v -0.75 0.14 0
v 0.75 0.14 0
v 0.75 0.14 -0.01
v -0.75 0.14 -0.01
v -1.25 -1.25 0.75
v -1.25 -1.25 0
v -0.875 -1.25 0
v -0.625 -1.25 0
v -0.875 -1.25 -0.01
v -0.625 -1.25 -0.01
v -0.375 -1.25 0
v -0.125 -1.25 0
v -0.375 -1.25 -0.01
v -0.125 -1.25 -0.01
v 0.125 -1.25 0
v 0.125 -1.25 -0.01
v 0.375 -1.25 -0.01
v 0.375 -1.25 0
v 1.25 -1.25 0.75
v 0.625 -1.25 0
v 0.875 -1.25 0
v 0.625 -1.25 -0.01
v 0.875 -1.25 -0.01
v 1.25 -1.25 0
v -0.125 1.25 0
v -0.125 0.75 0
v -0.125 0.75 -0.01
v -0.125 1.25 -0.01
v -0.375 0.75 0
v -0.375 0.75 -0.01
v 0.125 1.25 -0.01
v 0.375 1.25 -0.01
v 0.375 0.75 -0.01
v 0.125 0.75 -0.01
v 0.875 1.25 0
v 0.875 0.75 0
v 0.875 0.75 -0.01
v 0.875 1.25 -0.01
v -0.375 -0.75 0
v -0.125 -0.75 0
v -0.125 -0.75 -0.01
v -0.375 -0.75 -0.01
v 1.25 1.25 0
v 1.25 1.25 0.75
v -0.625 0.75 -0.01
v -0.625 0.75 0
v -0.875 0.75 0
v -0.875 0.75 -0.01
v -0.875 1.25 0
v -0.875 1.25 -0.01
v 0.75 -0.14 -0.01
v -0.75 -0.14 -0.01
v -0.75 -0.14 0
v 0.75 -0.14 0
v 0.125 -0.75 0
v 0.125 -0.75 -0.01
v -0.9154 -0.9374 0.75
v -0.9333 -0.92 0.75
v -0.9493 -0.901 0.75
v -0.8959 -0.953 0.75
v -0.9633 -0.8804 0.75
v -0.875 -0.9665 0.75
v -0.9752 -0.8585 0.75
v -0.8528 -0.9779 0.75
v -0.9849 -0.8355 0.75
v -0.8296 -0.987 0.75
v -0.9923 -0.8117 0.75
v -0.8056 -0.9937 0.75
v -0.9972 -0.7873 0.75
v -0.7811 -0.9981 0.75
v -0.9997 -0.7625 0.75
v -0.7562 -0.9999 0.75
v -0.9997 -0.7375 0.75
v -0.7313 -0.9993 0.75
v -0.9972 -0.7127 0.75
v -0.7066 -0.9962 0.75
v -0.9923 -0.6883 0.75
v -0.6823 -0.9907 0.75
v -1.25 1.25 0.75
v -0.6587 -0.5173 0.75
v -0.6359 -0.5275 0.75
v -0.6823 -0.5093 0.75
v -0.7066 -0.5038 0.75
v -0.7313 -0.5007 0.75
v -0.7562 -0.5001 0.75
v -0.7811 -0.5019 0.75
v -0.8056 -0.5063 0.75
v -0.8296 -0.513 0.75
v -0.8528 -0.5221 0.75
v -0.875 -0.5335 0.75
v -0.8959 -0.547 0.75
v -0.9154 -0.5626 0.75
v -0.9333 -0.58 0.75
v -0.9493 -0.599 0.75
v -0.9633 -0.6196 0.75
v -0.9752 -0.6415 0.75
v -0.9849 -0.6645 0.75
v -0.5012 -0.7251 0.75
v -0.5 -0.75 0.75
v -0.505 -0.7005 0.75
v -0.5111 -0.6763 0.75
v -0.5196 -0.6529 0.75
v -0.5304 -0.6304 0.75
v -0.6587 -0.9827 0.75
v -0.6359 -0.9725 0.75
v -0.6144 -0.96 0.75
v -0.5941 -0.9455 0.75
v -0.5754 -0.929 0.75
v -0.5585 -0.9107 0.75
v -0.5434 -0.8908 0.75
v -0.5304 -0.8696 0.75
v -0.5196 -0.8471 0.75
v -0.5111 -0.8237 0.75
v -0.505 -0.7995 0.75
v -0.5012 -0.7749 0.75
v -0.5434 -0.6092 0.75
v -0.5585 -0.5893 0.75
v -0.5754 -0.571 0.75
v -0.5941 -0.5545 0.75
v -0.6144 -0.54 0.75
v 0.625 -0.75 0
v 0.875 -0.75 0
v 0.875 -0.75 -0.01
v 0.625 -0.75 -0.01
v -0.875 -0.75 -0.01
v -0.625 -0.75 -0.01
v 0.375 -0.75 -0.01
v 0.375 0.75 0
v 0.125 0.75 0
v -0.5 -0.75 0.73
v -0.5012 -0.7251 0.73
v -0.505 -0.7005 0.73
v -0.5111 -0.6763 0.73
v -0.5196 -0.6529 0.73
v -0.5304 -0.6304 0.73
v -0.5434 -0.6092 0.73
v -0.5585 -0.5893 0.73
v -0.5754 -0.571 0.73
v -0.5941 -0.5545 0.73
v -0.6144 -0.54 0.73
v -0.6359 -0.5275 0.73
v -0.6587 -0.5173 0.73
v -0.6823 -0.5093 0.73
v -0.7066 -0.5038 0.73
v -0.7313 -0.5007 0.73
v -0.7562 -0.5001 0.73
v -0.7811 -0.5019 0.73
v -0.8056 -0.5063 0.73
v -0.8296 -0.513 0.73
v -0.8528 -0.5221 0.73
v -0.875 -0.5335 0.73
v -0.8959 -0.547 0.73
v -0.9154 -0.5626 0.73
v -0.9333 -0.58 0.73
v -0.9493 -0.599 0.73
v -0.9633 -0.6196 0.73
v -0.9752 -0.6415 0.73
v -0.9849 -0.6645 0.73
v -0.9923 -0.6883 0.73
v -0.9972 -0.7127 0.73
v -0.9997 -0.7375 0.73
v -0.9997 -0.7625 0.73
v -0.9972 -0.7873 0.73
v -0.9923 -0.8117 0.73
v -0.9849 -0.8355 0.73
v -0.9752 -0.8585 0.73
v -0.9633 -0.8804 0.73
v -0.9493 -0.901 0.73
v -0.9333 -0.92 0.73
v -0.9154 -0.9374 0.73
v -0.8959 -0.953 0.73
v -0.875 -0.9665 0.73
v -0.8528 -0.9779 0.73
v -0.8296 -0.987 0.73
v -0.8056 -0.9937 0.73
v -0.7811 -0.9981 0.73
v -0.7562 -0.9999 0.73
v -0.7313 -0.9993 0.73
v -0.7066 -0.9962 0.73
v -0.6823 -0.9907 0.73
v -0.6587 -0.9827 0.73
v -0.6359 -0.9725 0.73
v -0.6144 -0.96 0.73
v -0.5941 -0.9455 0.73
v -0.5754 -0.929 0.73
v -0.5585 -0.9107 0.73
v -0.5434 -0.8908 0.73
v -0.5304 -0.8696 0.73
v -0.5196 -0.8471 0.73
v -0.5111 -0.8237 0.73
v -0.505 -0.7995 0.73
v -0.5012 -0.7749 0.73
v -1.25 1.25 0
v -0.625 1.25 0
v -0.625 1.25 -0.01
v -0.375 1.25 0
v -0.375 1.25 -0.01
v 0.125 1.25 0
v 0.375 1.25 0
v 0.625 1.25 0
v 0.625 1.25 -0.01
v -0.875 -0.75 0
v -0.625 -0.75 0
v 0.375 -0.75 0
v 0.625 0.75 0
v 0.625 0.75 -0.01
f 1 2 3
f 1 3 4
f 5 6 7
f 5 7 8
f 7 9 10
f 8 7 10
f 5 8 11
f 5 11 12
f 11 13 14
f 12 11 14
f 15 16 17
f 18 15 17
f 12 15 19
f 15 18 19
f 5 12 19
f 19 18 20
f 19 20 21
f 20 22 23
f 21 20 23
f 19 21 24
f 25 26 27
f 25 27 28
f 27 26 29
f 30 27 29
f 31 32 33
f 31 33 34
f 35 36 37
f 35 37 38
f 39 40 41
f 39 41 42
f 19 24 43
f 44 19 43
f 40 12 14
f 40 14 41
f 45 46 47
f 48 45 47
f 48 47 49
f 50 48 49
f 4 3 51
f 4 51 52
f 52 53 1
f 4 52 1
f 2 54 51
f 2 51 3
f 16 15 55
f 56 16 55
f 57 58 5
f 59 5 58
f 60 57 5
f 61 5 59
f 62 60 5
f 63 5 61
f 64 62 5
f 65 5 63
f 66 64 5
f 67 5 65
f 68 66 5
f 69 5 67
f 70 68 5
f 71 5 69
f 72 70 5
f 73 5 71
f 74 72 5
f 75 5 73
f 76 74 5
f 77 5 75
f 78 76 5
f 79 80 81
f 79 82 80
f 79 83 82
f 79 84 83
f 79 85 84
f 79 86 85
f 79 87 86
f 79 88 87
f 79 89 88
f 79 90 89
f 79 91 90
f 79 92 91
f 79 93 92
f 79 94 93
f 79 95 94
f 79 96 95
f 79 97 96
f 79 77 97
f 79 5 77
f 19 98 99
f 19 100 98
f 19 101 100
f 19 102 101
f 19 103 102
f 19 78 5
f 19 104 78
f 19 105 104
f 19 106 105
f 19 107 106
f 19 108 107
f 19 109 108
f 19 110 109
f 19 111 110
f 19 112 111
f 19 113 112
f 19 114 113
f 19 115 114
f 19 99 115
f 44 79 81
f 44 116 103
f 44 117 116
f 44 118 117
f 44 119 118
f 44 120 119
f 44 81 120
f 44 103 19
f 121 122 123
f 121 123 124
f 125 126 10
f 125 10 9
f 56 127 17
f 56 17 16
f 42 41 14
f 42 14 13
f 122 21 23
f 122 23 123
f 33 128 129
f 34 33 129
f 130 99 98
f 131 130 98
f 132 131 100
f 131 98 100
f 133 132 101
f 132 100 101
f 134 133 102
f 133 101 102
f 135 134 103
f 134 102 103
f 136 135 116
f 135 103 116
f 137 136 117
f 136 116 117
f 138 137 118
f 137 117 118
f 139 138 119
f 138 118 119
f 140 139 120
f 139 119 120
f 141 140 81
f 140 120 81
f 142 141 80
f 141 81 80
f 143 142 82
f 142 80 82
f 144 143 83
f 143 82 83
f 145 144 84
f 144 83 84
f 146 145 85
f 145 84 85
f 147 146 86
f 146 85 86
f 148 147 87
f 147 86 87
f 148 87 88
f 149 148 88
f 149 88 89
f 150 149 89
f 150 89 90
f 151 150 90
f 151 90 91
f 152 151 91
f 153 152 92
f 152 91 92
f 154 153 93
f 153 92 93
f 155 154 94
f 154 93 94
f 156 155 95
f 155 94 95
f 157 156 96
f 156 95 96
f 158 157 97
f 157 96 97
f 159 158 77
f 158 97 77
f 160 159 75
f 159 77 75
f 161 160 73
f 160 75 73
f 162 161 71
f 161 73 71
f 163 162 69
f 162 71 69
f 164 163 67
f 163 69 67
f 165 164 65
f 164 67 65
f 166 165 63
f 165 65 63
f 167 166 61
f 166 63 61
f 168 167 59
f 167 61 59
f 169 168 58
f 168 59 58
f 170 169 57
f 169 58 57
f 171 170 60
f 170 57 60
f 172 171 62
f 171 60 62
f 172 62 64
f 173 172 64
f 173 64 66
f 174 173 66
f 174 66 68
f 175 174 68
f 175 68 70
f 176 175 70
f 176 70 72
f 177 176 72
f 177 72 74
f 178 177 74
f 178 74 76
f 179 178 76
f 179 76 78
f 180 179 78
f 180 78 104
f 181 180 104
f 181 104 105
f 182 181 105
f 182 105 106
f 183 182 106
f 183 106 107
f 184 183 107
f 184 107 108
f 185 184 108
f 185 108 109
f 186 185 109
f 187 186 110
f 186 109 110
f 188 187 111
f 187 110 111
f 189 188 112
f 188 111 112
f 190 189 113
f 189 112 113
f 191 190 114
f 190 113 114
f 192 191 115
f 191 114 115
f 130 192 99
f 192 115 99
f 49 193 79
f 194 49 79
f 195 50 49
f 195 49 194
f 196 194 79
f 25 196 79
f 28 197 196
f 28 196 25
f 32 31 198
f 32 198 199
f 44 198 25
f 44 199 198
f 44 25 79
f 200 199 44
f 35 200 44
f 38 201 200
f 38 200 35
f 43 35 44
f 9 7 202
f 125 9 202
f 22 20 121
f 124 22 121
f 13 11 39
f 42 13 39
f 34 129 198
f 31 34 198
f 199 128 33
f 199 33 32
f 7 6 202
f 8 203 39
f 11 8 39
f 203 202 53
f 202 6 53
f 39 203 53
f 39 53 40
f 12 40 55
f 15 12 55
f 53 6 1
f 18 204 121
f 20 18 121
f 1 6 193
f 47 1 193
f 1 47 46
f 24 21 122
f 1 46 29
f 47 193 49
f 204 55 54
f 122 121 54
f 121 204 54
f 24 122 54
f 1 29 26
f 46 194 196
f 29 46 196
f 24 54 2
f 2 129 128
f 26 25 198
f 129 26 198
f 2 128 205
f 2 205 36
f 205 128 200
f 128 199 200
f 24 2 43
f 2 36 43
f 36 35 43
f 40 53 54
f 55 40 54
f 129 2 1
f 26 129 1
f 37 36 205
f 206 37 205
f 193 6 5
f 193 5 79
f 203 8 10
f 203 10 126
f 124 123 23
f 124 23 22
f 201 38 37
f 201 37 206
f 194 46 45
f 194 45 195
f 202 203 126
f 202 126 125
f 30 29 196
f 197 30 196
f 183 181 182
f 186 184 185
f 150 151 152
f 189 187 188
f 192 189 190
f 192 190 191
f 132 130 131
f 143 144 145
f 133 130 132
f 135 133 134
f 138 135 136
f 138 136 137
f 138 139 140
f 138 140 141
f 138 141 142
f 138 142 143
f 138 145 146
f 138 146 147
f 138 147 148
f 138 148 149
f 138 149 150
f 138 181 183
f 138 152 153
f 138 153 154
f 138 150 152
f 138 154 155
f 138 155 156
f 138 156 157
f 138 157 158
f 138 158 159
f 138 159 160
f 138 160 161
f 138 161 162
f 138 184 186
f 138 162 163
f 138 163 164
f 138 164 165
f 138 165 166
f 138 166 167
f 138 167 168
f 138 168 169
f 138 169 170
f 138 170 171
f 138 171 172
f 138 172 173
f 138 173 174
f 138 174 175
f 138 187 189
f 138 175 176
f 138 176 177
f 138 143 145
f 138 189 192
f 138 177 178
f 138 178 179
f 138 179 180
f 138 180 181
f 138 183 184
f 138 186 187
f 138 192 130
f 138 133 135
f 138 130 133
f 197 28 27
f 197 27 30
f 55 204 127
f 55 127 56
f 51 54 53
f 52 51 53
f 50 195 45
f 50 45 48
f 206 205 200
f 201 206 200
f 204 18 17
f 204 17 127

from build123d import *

# Parameters (mm, degrees)
SKETCH1_W           = 2.5
SKETCH1_H           = 2.5
BOSS_EXTRUDE1_DEPTH = 0.75
SKETCH2_R           = 0.25
CUT_EXTRUDE1_DEPTH  = 0.02
SKETCH3_W           = 0.25
SKETCH3_H           = 0.5
SKETCH3_W_2         = 1.5
SKETCH3_H_2         = 0.28
BOSS_EXTRUDE2_DEPTH = 0.01


with BuildPart() as part:
    # Sketch1 → Boss-Extrude1 (new body)
    with BuildSketch(Plane.XY):
        Rectangle(SKETCH1_W, SKETCH1_H)
    extrude(amount=BOSS_EXTRUDE1_DEPTH)

    # Sketch2 → Cut-Extrude1 (cut)
    with BuildSketch(Plane.XY.offset(0.75)):
        with Locations((-0.75, -0.75)):
            Circle(SKETCH2_R)
    extrude(amount=-CUT_EXTRUDE1_DEPTH, mode=Mode.SUBTRACT)

    # Sketch3 → Boss-Extrude2 (add)
    with BuildSketch(Plane(origin=(0, 0, 0), x_dir=(-1, 0, 0), z_dir=(0, 0, -1))):
        with Locations((0.75, -1)):
            Rectangle(SKETCH3_W, SKETCH3_H)
        with Locations((0.25, -1)):
            Rectangle(SKETCH3_W, SKETCH3_H)
        with Locations((-0.25, -1)):
            Rectangle(SKETCH3_W, SKETCH3_H)
        with Locations((-0.75, -1)):
            Rectangle(SKETCH3_W, SKETCH3_H)
        with Locations((-0.75, 1)):
            Rectangle(SKETCH3_W, SKETCH3_H)
        with Locations((-0.25, 1)):
            Rectangle(SKETCH3_W, SKETCH3_H)
        with Locations((0.25, 1)):
            Rectangle(SKETCH3_W, SKETCH3_H)
        with Locations((0.75, 1)):
            Rectangle(SKETCH3_W, SKETCH3_H)
        Rectangle(SKETCH3_W_2, SKETCH3_H_2)
    extrude(amount=BOSS_EXTRUDE2_DEPTH)


solid = part.part
